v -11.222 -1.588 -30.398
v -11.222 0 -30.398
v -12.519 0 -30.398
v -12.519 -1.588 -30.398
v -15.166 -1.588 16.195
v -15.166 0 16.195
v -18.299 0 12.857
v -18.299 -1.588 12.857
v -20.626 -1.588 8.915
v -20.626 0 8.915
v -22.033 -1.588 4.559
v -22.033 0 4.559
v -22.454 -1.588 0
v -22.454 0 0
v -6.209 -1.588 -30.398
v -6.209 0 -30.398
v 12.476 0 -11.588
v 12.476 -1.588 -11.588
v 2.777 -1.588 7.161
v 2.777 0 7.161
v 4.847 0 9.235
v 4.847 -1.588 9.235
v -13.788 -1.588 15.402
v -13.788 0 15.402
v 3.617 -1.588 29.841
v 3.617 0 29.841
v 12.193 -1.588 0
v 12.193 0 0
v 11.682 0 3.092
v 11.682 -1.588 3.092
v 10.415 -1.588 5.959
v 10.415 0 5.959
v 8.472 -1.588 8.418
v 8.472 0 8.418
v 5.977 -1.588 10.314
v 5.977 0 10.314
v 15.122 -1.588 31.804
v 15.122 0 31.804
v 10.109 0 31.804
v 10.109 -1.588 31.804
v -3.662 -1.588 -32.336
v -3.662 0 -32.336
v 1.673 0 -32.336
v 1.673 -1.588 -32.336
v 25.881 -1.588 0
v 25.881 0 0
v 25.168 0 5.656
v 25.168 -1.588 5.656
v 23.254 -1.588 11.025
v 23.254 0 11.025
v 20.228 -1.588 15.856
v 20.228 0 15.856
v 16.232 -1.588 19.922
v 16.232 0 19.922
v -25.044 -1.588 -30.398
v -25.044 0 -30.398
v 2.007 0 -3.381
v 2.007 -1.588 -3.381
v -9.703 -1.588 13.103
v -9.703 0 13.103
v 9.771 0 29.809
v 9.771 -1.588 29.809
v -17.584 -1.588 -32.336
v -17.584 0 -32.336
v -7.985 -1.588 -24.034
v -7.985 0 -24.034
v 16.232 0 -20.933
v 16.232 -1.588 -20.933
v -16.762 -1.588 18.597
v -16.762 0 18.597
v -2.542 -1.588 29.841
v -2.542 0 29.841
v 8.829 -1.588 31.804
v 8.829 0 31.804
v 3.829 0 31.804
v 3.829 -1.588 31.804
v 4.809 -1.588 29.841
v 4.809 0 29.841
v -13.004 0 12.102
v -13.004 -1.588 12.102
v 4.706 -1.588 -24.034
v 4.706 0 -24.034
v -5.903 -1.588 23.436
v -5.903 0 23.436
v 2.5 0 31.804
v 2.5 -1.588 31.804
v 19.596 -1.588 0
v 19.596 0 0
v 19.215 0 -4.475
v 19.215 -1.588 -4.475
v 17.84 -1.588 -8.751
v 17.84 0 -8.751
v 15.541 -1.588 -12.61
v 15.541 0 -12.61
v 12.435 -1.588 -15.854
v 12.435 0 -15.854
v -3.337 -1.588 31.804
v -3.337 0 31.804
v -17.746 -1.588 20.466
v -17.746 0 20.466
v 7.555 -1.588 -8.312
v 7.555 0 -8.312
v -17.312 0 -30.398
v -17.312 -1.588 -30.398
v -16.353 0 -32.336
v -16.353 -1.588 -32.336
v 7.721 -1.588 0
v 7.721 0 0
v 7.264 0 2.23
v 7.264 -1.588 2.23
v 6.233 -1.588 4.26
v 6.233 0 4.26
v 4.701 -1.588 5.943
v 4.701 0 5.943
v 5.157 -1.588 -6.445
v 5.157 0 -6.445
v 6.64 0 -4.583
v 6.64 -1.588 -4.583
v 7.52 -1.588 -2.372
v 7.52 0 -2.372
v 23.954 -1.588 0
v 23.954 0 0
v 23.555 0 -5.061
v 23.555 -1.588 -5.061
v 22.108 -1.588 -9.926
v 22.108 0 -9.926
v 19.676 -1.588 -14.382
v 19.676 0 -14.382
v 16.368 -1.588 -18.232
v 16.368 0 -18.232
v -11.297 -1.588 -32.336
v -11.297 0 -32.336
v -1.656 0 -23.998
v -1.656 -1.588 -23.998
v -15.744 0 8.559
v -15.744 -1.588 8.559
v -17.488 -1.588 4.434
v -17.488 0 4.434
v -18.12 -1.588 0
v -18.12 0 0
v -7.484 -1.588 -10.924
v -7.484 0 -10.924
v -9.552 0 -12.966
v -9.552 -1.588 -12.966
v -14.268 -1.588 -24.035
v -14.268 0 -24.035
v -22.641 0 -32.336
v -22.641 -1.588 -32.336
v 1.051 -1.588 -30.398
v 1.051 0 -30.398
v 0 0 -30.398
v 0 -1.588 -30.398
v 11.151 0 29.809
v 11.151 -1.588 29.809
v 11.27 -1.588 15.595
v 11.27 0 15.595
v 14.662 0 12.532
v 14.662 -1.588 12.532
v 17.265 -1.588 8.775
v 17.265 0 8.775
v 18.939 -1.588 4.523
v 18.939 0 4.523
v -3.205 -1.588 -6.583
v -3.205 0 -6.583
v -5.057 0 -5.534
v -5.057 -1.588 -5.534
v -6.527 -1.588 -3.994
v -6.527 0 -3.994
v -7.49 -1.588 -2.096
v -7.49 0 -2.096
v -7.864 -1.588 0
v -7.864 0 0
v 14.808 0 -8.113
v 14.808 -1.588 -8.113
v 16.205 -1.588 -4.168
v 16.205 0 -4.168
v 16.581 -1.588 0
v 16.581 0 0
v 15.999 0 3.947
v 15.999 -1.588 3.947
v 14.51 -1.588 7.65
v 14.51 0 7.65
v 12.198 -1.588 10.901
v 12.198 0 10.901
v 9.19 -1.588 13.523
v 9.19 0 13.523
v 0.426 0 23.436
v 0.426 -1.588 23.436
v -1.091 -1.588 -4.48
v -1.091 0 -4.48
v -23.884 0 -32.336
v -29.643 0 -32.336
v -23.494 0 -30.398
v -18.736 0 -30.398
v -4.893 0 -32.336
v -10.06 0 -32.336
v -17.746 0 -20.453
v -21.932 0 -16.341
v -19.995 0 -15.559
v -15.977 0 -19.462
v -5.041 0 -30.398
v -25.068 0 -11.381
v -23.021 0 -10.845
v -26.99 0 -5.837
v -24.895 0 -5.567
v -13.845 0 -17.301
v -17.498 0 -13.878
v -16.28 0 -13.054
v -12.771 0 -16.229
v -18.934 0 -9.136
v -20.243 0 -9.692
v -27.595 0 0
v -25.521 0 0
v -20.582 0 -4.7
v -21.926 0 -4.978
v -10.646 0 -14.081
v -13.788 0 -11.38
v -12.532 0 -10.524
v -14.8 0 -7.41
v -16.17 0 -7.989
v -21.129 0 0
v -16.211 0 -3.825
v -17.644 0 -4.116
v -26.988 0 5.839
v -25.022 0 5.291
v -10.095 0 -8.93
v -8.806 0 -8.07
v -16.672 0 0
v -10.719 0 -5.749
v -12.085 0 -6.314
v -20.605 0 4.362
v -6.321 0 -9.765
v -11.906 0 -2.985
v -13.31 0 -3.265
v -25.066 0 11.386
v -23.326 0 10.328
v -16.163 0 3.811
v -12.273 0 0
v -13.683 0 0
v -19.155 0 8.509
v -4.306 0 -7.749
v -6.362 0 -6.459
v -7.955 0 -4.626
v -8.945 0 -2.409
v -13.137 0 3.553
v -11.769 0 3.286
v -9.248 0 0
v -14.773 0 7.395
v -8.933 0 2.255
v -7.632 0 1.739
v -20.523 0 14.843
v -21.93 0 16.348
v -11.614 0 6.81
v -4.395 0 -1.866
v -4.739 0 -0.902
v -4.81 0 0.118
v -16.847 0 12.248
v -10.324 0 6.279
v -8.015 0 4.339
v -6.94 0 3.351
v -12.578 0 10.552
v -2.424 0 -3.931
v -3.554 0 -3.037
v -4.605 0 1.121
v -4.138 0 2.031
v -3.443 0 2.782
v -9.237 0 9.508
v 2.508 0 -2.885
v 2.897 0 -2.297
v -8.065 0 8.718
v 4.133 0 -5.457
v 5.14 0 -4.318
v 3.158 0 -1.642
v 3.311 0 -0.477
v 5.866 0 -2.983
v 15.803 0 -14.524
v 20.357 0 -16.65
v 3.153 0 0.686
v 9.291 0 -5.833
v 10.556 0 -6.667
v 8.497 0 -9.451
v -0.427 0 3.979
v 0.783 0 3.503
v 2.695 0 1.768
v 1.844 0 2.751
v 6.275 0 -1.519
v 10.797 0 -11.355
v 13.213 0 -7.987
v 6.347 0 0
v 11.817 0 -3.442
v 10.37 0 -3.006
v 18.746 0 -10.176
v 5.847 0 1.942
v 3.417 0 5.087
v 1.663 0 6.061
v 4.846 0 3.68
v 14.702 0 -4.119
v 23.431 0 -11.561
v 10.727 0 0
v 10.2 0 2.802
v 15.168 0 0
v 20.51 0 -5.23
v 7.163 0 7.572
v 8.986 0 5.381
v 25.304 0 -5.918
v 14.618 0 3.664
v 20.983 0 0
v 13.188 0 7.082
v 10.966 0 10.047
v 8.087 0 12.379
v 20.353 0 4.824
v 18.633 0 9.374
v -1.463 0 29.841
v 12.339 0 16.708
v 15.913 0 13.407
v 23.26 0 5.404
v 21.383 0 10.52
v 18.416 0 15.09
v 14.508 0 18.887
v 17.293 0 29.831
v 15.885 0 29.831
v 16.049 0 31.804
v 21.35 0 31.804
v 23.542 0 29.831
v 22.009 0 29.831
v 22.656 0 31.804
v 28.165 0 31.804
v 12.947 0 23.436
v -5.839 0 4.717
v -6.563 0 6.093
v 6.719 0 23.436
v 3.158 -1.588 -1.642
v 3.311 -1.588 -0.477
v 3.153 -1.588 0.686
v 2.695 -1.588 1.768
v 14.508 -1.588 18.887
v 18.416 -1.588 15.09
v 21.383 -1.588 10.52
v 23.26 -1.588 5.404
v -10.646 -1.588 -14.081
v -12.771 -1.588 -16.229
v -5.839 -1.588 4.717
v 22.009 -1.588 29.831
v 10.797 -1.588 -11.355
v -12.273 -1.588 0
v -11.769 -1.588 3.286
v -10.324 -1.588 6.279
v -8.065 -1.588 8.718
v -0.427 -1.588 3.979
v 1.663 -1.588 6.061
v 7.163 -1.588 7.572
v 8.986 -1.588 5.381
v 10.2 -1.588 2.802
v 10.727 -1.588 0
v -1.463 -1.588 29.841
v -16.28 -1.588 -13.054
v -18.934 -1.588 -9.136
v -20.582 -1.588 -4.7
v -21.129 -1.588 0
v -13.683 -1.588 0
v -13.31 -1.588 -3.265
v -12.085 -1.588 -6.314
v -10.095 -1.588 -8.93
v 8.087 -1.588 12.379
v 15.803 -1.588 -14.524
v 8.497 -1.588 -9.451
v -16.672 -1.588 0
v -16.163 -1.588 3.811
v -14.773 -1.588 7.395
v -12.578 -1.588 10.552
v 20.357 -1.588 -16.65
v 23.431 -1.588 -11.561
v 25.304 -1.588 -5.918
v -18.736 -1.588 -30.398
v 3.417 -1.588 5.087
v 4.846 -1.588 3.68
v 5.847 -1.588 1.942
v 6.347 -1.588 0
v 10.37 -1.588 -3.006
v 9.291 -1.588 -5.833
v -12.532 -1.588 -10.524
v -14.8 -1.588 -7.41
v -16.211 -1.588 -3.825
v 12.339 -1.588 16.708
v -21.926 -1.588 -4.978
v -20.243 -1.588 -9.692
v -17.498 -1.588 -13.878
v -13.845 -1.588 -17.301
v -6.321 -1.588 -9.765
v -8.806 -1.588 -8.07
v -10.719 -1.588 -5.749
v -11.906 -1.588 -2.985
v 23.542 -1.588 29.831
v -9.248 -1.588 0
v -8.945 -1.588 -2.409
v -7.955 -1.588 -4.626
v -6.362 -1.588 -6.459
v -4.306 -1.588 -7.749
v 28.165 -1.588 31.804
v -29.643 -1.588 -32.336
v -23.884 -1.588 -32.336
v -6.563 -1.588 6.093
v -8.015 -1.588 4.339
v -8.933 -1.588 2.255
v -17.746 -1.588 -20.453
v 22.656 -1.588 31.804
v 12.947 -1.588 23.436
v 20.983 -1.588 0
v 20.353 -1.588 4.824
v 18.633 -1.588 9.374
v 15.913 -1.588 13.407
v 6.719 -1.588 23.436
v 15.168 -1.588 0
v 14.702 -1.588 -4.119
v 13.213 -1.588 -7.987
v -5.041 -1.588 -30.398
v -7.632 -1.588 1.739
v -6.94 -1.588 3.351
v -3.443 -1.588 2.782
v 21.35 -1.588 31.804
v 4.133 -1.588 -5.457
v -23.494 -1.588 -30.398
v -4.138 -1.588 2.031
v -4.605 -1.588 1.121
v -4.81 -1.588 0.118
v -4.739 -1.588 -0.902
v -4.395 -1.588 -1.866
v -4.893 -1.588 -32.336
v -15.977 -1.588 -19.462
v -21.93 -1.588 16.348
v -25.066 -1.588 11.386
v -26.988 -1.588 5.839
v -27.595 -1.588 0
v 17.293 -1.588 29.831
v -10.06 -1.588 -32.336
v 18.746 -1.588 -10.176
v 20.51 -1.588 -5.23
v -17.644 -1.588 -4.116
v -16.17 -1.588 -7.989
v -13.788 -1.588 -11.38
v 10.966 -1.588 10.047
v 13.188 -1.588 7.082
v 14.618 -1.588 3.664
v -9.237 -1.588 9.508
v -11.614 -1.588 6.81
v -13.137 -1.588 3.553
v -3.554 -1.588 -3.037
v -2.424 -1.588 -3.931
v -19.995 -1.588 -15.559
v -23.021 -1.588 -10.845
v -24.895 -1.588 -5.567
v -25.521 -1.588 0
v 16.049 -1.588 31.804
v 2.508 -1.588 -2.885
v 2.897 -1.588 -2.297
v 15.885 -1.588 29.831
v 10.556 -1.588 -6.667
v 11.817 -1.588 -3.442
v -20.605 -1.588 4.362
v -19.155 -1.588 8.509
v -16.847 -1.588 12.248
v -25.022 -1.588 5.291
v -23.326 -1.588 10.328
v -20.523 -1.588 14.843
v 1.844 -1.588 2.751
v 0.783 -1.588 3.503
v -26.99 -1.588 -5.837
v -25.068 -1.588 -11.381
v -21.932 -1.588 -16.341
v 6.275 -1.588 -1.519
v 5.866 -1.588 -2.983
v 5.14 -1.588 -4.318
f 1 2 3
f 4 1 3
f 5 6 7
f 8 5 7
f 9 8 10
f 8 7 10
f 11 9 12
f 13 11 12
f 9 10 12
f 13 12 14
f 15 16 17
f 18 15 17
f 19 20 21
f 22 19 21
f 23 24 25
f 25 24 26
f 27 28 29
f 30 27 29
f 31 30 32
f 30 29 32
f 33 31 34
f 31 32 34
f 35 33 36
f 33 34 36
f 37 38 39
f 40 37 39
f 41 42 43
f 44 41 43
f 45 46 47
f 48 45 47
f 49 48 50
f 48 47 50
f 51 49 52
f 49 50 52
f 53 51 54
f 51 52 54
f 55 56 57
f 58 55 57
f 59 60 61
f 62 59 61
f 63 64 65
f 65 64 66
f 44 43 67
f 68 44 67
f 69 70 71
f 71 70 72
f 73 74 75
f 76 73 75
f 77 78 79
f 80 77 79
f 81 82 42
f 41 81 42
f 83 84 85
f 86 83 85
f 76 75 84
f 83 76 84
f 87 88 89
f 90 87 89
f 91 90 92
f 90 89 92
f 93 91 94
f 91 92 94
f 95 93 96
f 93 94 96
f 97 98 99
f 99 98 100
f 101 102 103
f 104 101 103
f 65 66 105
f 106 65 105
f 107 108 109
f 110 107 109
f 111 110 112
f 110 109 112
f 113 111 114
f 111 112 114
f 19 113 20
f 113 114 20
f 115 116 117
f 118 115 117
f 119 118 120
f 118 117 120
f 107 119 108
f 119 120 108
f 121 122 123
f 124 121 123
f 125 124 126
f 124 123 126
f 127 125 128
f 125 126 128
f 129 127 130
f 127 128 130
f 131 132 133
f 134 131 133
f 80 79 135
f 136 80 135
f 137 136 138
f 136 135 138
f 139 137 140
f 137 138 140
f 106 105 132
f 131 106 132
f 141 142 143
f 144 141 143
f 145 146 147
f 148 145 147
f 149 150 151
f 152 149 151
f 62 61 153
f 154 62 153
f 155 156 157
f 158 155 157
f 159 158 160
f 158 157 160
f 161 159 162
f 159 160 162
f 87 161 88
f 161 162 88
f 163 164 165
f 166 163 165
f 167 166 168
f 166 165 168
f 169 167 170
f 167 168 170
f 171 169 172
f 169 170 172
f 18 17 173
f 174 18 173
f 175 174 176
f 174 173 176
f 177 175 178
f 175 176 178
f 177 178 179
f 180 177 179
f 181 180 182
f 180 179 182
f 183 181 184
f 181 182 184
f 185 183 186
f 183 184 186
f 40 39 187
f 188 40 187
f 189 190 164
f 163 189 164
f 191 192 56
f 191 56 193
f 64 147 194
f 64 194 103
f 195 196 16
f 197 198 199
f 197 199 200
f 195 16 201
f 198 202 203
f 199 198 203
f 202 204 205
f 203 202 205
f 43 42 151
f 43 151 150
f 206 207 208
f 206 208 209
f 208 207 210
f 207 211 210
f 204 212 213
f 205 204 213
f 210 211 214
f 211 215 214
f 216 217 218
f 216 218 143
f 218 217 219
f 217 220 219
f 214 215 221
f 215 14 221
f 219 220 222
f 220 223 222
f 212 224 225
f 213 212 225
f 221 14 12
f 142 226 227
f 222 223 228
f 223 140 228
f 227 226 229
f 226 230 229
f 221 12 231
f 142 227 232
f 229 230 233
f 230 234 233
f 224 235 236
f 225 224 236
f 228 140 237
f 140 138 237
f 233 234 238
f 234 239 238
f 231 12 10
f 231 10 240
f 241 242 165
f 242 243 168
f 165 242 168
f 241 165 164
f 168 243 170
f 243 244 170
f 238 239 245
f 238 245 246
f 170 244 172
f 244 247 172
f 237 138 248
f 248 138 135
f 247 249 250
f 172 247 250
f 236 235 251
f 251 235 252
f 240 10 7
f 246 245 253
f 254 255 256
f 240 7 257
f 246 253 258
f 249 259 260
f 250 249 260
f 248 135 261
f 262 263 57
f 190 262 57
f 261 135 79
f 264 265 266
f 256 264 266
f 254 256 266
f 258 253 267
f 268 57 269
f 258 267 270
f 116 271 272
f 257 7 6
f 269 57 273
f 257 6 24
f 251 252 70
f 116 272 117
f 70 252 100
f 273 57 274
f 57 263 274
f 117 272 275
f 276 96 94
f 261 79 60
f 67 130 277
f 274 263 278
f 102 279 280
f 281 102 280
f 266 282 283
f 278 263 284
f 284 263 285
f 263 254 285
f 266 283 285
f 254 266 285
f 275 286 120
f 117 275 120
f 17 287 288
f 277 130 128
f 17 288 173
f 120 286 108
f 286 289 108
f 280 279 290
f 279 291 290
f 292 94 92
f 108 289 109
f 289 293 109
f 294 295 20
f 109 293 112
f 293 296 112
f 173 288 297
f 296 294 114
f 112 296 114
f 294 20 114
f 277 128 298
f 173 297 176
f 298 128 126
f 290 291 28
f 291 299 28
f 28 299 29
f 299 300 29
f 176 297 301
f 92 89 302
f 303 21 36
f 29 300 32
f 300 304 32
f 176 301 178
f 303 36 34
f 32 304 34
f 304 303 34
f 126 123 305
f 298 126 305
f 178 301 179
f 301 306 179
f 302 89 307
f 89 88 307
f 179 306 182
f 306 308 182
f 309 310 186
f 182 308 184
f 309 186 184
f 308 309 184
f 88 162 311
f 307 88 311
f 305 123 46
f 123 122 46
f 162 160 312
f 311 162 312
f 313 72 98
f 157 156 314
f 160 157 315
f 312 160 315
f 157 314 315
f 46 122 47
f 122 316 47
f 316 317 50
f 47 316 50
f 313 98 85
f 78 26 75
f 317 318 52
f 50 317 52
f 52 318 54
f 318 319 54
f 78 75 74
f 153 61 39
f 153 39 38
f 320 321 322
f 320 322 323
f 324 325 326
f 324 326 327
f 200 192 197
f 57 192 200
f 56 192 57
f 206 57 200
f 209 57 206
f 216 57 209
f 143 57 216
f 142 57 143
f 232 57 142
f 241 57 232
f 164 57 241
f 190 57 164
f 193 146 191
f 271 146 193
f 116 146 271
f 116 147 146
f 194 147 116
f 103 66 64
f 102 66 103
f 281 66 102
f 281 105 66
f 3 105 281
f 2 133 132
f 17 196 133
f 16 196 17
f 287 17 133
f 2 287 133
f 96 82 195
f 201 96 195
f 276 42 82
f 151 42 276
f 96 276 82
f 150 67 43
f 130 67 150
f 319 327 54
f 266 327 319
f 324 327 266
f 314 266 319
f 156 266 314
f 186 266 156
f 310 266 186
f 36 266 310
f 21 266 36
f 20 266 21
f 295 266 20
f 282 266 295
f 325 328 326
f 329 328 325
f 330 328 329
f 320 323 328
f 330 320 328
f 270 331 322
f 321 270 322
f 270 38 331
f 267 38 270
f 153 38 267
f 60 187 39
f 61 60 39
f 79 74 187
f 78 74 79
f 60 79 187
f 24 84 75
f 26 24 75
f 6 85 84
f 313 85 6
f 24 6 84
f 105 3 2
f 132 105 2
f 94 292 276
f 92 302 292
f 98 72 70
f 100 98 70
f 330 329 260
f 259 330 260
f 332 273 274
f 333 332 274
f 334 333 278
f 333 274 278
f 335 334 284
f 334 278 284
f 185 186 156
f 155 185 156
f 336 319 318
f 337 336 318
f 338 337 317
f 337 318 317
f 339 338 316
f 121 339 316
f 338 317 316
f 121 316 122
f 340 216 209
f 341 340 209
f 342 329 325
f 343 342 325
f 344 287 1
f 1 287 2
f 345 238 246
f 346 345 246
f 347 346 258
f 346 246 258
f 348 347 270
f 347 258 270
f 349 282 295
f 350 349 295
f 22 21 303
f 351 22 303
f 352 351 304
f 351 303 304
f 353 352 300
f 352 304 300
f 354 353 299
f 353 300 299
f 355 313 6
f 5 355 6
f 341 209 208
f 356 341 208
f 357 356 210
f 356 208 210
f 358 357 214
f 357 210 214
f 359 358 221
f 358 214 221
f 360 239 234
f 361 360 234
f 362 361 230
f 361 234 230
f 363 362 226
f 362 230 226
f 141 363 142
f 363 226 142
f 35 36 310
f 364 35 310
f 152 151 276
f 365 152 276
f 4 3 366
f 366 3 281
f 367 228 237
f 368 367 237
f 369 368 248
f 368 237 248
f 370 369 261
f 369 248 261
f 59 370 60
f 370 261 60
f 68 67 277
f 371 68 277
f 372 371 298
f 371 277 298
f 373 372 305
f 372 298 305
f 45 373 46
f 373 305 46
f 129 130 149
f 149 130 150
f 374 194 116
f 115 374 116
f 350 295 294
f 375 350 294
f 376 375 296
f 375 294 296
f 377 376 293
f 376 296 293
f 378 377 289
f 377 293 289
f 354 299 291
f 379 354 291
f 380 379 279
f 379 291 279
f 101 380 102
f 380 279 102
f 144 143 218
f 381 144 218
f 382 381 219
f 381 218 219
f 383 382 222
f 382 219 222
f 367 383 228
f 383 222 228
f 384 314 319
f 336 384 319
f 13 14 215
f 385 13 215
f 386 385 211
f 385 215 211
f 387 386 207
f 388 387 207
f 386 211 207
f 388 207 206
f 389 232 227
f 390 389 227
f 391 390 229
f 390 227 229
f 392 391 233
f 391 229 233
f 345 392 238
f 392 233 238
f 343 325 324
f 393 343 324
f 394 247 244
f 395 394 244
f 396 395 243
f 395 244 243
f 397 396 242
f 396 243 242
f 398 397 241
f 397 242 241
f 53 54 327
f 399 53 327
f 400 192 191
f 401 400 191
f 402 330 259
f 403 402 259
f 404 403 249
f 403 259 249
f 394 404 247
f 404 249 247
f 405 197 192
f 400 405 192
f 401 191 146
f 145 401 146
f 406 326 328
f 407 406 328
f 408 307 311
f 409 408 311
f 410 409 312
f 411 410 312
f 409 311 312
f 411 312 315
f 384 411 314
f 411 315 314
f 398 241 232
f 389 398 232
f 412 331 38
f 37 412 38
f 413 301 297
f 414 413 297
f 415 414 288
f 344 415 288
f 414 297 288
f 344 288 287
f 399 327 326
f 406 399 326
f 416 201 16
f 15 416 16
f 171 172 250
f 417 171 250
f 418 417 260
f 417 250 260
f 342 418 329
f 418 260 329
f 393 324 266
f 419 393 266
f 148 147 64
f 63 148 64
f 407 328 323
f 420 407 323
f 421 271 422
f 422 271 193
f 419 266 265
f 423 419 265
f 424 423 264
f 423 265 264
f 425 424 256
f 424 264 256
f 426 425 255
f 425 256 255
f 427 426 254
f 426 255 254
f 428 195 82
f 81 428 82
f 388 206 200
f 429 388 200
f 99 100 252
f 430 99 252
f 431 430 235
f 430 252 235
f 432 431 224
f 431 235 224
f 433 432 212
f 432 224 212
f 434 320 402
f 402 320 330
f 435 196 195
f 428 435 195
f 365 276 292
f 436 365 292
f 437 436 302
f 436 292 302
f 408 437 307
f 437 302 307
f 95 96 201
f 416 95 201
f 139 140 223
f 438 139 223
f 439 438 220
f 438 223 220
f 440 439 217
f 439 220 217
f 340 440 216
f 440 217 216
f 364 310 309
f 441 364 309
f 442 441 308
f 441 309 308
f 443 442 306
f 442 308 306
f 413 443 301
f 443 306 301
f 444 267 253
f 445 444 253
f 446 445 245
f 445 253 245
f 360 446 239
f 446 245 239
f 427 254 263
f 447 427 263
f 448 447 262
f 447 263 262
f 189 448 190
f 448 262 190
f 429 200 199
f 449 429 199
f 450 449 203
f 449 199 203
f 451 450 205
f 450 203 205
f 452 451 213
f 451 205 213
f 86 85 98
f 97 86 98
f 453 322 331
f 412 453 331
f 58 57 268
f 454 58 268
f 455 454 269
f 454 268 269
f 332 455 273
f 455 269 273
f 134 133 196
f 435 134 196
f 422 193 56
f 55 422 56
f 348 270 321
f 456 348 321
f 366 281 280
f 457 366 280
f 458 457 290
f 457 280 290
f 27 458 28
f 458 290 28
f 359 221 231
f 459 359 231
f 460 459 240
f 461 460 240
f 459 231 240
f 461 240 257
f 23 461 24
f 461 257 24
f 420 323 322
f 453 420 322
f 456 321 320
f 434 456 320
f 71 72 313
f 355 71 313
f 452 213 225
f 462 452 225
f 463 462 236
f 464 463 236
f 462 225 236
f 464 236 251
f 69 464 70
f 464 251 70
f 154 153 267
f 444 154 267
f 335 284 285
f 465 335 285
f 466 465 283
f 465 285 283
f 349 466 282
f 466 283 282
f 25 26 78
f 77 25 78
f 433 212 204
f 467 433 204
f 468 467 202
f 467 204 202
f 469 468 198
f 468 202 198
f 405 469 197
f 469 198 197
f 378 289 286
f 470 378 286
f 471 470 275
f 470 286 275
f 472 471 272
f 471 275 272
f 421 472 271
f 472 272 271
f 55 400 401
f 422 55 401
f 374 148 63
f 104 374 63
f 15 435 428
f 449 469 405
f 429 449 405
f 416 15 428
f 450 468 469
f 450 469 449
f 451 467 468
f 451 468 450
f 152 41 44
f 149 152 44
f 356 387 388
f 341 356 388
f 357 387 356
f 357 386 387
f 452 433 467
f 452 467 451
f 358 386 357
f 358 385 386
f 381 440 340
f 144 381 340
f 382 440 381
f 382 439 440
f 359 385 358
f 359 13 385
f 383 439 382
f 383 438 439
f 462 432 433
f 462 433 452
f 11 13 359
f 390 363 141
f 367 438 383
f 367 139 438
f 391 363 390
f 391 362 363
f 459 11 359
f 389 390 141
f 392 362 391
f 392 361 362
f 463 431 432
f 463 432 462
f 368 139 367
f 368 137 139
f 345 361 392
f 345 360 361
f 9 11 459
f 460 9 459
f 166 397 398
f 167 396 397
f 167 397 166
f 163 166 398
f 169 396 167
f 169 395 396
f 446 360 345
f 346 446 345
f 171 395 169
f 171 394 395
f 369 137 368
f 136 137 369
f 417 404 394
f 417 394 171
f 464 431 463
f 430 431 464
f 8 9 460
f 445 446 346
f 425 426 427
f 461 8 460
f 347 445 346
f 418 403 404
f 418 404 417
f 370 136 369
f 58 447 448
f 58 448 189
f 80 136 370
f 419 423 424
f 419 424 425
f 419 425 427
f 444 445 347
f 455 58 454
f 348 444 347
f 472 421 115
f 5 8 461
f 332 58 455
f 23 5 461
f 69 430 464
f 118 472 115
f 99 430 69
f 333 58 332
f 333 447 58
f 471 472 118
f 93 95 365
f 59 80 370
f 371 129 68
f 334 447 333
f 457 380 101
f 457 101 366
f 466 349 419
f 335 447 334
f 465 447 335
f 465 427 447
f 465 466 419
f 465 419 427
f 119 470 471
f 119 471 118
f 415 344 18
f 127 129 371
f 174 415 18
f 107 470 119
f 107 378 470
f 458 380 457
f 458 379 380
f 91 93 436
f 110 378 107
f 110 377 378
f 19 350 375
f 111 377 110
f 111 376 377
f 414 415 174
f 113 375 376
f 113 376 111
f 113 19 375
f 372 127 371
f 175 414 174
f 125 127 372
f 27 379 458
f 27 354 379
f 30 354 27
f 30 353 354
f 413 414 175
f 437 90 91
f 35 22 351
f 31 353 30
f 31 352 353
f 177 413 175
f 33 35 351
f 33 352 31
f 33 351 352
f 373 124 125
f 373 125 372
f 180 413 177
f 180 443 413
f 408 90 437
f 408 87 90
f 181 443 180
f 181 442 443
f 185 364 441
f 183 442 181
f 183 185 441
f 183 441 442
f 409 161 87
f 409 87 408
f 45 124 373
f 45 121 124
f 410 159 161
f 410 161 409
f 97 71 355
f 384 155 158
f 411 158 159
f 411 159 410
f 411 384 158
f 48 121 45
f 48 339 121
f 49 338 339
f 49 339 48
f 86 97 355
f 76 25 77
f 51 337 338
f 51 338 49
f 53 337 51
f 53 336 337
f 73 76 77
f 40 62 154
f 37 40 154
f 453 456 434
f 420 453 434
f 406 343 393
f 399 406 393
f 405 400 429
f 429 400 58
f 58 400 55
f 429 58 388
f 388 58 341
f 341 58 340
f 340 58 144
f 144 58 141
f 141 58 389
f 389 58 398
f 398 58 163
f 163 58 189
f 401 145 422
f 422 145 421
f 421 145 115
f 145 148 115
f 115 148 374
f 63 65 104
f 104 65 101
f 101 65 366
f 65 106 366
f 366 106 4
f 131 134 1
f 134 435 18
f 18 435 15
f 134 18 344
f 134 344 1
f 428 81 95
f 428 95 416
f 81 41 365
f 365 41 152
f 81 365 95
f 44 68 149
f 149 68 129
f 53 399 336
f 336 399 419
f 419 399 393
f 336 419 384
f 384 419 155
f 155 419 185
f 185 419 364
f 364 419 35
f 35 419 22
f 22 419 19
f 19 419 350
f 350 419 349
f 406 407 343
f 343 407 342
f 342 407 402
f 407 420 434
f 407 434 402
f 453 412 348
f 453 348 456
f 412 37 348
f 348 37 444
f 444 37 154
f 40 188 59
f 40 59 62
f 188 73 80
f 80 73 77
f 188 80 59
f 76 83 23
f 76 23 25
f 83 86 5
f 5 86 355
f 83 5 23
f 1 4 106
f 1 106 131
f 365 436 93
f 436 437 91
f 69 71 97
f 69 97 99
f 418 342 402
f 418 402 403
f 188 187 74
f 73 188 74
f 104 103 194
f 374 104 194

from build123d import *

# Parameters (mm, degrees)
F1_DEPTH = 1.5875


with BuildPart() as f1:
    # F0 (on Front) → F1 (new body)
    with BuildSketch(Plane.XZ):
        with BuildLine():
            Line((2.500466, 31.804252), (-3.337374, 31.804252))
            Line((-3.337374, 31.804252), (-17.745788, 20.465644))
            ThreePointArc((-17.745788, 20.465644), (-25.065561, 11.385533), (-27.594821, 0))
            ThreePointArc((-27.594821, 0), (-25.068458, -11.38136), (-17.745788, -20.453094))
            Line((-17.745788, -20.453094), (-29.64324, -32.335669))
            Line((-29.64324, -32.335669), (-23.884054, -32.335669))
            Line((-23.884054, -32.335669), (-14.268195, -24.034924))
            Line((-14.268195, -24.034924), (-22.640626, -32.335669))
            Line((-22.640626, -32.335669), (-17.583598, -32.335669))
            Line((-17.583598, -32.335669), (-7.984732, -24.03398))
            Line((-7.984732, -24.03398), (-16.352598, -32.335669))
            Line((-16.352598, -32.335669), (-11.296707, -32.335669))
            Line((-11.296707, -32.335669), (-1.655925, -23.997727))
            Line((-1.655925, -23.997727), (-10.060332, -32.335669))
            Line((-10.060332, -32.335669), (-4.89258, -32.335669))
            Line((-4.89258, -32.335669), (4.706284, -24.033981))
            Line((4.706284, -24.033981), (-3.66158, -32.335669))
            Line((-3.66158, -32.335669), (1.67275, -32.335669))
            Line((1.67275, -32.335669), (16.232245, -20.932899))
            ThreePointArc((16.232245, -20.932899), (23.431336, -11.561058), (25.880881, 0))
            ThreePointArc((25.880881, 0), (23.254287, 11.025444), (16.232245, 19.922092))
            Line((16.232245, 19.922092), (28.165267, 31.804252))
            Line((28.165267, 31.804252), (22.655676, 31.804252))
            Line((22.655676, 31.804252), (12.946506, 23.436493))
            Line((12.946506, 23.436493), (21.350084, 31.804252))
            Line((21.350084, 31.804252), (16.049387, 31.804252))
            Line((16.049387, 31.804252), (6.718841, 23.436493))
            Line((6.718841, 23.436493), (15.122419, 31.804252))
            Line((15.122419, 31.804252), (10.108952, 31.804252))
            Line((10.108952, 31.804252), (0.425895, 23.436493))
            Line((0.425895, 23.436493), (8.829473, 31.804252))
            Line((8.829473, 31.804252), (3.829063, 31.804252))
            Line((3.829063, 31.804252), (-5.903112, 23.436493))
            Line((-5.903112, 23.436493), (2.500466, 31.804252))
        make_face()
        with BuildLine():
            ThreePointArc((2.694642, 1.767532), (1.335932, 3.159091), (-0.427456, 3.979452))
            Line((-0.427456, 3.979452), (1.66349, 6.061486))
            ThreePointArc((1.66349, 6.061486), (4.845747, 3.680126), (6.347182, 0))
            ThreePointArc((6.347182, 0), (5.866074, -2.982653), (4.133003, -5.457355))
            Line((4.133003, -5.457355), (-23.493576, -30.398272))
            Line((-23.493576, -30.398272), (-25.043647, -30.398272))
            Line((-25.043647, -30.398272), (2.006969, -3.381483))
            ThreePointArc((2.006969, -3.381483), (2.71769, -2.601128), (3.157621, -1.64168))
            ThreePointArc((3.157621, -1.64168), (3.270361, 0.109673), (2.694642, 1.767532))
        make_face(mode=Mode.SUBTRACT)
        with BuildLine():
            ThreePointArc((7.720564, 0), (6.233101, 4.259643), (2.777397, 7.160541))
            Line((2.777397, 7.160541), (4.846783, 9.234832))
            ThreePointArc((4.846783, 9.234832), (8.986332, 5.381127), (10.72713, 0))
            ThreePointArc((10.72713, 0), (9.918057, -4.45281), (7.554526, -8.312322))
            Line((7.554526, -8.312322), (-17.312014, -30.398272))
            Line((-17.312014, -30.398272), (-18.735651, -30.398272))
            Line((-18.735651, -30.398272), (5.156565, -6.444786))
            ThreePointArc((5.156565, -6.444786), (7.161366, -3.509953), (7.720564, 0))
        make_face(mode=Mode.SUBTRACT)
        with BuildLine():
            ThreePointArc((8.497341, -9.450918), (11.293115, -5.096154), (12.192859, 0))
            ThreePointArc((12.192859, 0), (10.415009, 5.958783), (5.976826, 10.314284))
            Line((5.976826, 10.314284), (8.086616, 12.378573))
            ThreePointArc((8.086616, 12.378573), (13.188094, 7.082195), (15.167798, 0))
            ThreePointArc((15.167798, 0), (14.08092, -6.100532), (10.796622, -11.355165))
            Line((10.796622, -11.355165), (-11.222056, -30.398272))
            Line((-11.222056, -30.398272), (-12.51897, -30.398272))
            Line((-12.51897, -30.398272), (8.497341, -9.450918))
        make_face(mode=Mode.SUBTRACT)
        with BuildLine():
            Line((-5.040918, -30.398272), (-6.208889, -30.398272))
            Line((-6.208889, -30.398272), (12.476413, -11.58771))
            ThreePointArc((12.476413, -11.58771), (15.630392, -6.184107), (16.580828, 0))
            ThreePointArc((16.580828, 0), (14.510264, 7.649505), (9.189624, 13.522575))
            Line((9.189624, 13.522575), (11.269993, 15.594592))
            ThreePointArc((11.269993, 15.594592), (17.264531, 8.775118), (19.596276, 0))
            ThreePointArc((19.596276, 0), (17.840213, -8.751202), (12.435093, -15.854157))
            Line((12.435093, -15.854157), (-5.040918, -30.398272))
        make_face(mode=Mode.SUBTRACT)
        with BuildLine():
            ThreePointArc((20.982919, 0), (18.632523, 9.374038), (12.338778, 16.707912))
            Line((12.338778, 16.707912), (14.508339, 18.886948))
            ThreePointArc((14.508339, 18.886948), (21.382927, 10.519577), (23.954181, 0))
            ThreePointArc((23.954181, 0), (22.107779, -9.926357), (16.36753, -18.232456))
            Line((16.36753, -18.232456), (1.051465, -30.398272))
            Line((1.051465, -30.398272), (0, -30.398272))
            Line((0, -30.398272), (15.803264, -14.524432))
            ThreePointArc((15.803264, -14.524432), (19.78452, -7.758422), (20.982919, 0))
        make_face(mode=Mode.SUBTRACT)
        with BuildLine():
            Line((-16.761772, 18.597473), (-2.54207, 29.840623))
            Line((-2.54207, 29.840623), (-1.463471, 29.840623))
            Line((-1.463471, 29.840623), (-15.165877, 16.19467))
            ThreePointArc((-15.165877, 16.19467), (-20.625905, 8.914632), (-22.453522, 0))
            ThreePointArc((-22.453522, 0), (-20.242724, -9.692341), (-13.844848, -17.301303))
            Line((-13.844848, -17.301303), (-15.977073, -19.462374))
            ThreePointArc((-15.977073, -19.462374), (-23.020704, -10.845215), (-25.520603, 0))
            ThreePointArc((-25.520603, 0), (-23.326341, 10.327876), (-16.761772, 18.597473))
        make_face(mode=Mode.SUBTRACT)
        with BuildLine():
            Line((-13.788489, 15.40208), (3.616895, 29.840623))
            Line((3.616895, 29.840623), (4.808587, 29.840623))
            Line((4.808587, 29.840623), (-13.00357, 12.101851))
            ThreePointArc((-13.00357, 12.101851), (-16.74891, 6.552839), (-18.11982, 0))
            ThreePointArc((-18.11982, 0), (-16.169546, -7.988951), (-10.645506, -14.080904))
            Line((-10.645506, -14.080904), (-12.770631, -16.228664))
            ThreePointArc((-12.770631, -16.228664), (-18.934176, -9.136403), (-21.128622, 0))
            ThreePointArc((-21.128622, 0), (-19.154685, 8.509361), (-13.788489, 15.40208))
        make_face(mode=Mode.SUBTRACT)
        with BuildLine():
            Line((-9.702722, 13.103459), (9.771443, 29.809413))
            Line((9.771443, 29.809413), (11.151096, 29.809413))
            Line((11.151096, 29.809413), (-9.237427, 9.507794))
            ThreePointArc((-9.237427, 9.507794), (-12.491403, 5.236064), (-13.682904, 0))
            ThreePointArc((-13.682904, 0), (-12.084754, -6.314048), (-7.484162, -10.924453))
            Line((-7.484162, -10.924453), (-9.551929, -12.96554))
            ThreePointArc((-9.551929, -12.96554), (-14.800405, -7.409972), (-16.67208, 0))
            ThreePointArc((-16.67208, 0), (-14.772793, 7.394955), (-9.702722, 13.103459))
        make_face(mode=Mode.SUBTRACT)
        with BuildLine():
            Line((-8.06543, 8.717639), (15.884997, 29.83083))
            Line((15.884997, 29.83083), (17.292799, 29.83083))
            Line((17.292799, 29.83083), (-6.563151, 6.092896))
            ThreePointArc((-6.563151, 6.092896), (-8.545871, 3.328581), (-9.248127, 0))
            ThreePointArc((-9.248127, 0), (-7.954567, -4.625728), (-4.305757, -7.749323))
            Line((-4.305757, -7.749323), (-6.321113, -9.764679))
            ThreePointArc((-6.321113, -9.764679), (-10.718668, -5.748904), (-12.272709, 0))
            ThreePointArc((-12.272709, 0), (-11.158112, 4.836148), (-8.06543, 8.717639))
        make_face(mode=Mode.SUBTRACT)
        with BuildLine():
            Line((-5.838636, 4.71663), (22.008805, 29.83083))
            Line((22.008805, 29.83083), (23.542084, 29.83083))
            Line((23.542084, 29.83083), (-3.44265, 2.78213))
            ThreePointArc((-3.44265, 2.78213), (-4.742008, 0.626663), (-4.394693, -1.866074))
            ThreePointArc((-4.394693, -1.866074), (-3.019974, -3.523453), (-1.090547, -4.479523))
            Line((-1.090547, -4.479523), (-3.204506, -6.583116))
            ThreePointArc((-3.204506, -6.583116), (-6.527039, -3.994261), (-7.863931, 0))
            ThreePointArc((-7.863931, 0), (-7.341413, 2.568774), (-5.838636, 4.71663))
        make_face(mode=Mode.SUBTRACT)
    extrude(amount=F1_DEPTH)


solid = f1.part
